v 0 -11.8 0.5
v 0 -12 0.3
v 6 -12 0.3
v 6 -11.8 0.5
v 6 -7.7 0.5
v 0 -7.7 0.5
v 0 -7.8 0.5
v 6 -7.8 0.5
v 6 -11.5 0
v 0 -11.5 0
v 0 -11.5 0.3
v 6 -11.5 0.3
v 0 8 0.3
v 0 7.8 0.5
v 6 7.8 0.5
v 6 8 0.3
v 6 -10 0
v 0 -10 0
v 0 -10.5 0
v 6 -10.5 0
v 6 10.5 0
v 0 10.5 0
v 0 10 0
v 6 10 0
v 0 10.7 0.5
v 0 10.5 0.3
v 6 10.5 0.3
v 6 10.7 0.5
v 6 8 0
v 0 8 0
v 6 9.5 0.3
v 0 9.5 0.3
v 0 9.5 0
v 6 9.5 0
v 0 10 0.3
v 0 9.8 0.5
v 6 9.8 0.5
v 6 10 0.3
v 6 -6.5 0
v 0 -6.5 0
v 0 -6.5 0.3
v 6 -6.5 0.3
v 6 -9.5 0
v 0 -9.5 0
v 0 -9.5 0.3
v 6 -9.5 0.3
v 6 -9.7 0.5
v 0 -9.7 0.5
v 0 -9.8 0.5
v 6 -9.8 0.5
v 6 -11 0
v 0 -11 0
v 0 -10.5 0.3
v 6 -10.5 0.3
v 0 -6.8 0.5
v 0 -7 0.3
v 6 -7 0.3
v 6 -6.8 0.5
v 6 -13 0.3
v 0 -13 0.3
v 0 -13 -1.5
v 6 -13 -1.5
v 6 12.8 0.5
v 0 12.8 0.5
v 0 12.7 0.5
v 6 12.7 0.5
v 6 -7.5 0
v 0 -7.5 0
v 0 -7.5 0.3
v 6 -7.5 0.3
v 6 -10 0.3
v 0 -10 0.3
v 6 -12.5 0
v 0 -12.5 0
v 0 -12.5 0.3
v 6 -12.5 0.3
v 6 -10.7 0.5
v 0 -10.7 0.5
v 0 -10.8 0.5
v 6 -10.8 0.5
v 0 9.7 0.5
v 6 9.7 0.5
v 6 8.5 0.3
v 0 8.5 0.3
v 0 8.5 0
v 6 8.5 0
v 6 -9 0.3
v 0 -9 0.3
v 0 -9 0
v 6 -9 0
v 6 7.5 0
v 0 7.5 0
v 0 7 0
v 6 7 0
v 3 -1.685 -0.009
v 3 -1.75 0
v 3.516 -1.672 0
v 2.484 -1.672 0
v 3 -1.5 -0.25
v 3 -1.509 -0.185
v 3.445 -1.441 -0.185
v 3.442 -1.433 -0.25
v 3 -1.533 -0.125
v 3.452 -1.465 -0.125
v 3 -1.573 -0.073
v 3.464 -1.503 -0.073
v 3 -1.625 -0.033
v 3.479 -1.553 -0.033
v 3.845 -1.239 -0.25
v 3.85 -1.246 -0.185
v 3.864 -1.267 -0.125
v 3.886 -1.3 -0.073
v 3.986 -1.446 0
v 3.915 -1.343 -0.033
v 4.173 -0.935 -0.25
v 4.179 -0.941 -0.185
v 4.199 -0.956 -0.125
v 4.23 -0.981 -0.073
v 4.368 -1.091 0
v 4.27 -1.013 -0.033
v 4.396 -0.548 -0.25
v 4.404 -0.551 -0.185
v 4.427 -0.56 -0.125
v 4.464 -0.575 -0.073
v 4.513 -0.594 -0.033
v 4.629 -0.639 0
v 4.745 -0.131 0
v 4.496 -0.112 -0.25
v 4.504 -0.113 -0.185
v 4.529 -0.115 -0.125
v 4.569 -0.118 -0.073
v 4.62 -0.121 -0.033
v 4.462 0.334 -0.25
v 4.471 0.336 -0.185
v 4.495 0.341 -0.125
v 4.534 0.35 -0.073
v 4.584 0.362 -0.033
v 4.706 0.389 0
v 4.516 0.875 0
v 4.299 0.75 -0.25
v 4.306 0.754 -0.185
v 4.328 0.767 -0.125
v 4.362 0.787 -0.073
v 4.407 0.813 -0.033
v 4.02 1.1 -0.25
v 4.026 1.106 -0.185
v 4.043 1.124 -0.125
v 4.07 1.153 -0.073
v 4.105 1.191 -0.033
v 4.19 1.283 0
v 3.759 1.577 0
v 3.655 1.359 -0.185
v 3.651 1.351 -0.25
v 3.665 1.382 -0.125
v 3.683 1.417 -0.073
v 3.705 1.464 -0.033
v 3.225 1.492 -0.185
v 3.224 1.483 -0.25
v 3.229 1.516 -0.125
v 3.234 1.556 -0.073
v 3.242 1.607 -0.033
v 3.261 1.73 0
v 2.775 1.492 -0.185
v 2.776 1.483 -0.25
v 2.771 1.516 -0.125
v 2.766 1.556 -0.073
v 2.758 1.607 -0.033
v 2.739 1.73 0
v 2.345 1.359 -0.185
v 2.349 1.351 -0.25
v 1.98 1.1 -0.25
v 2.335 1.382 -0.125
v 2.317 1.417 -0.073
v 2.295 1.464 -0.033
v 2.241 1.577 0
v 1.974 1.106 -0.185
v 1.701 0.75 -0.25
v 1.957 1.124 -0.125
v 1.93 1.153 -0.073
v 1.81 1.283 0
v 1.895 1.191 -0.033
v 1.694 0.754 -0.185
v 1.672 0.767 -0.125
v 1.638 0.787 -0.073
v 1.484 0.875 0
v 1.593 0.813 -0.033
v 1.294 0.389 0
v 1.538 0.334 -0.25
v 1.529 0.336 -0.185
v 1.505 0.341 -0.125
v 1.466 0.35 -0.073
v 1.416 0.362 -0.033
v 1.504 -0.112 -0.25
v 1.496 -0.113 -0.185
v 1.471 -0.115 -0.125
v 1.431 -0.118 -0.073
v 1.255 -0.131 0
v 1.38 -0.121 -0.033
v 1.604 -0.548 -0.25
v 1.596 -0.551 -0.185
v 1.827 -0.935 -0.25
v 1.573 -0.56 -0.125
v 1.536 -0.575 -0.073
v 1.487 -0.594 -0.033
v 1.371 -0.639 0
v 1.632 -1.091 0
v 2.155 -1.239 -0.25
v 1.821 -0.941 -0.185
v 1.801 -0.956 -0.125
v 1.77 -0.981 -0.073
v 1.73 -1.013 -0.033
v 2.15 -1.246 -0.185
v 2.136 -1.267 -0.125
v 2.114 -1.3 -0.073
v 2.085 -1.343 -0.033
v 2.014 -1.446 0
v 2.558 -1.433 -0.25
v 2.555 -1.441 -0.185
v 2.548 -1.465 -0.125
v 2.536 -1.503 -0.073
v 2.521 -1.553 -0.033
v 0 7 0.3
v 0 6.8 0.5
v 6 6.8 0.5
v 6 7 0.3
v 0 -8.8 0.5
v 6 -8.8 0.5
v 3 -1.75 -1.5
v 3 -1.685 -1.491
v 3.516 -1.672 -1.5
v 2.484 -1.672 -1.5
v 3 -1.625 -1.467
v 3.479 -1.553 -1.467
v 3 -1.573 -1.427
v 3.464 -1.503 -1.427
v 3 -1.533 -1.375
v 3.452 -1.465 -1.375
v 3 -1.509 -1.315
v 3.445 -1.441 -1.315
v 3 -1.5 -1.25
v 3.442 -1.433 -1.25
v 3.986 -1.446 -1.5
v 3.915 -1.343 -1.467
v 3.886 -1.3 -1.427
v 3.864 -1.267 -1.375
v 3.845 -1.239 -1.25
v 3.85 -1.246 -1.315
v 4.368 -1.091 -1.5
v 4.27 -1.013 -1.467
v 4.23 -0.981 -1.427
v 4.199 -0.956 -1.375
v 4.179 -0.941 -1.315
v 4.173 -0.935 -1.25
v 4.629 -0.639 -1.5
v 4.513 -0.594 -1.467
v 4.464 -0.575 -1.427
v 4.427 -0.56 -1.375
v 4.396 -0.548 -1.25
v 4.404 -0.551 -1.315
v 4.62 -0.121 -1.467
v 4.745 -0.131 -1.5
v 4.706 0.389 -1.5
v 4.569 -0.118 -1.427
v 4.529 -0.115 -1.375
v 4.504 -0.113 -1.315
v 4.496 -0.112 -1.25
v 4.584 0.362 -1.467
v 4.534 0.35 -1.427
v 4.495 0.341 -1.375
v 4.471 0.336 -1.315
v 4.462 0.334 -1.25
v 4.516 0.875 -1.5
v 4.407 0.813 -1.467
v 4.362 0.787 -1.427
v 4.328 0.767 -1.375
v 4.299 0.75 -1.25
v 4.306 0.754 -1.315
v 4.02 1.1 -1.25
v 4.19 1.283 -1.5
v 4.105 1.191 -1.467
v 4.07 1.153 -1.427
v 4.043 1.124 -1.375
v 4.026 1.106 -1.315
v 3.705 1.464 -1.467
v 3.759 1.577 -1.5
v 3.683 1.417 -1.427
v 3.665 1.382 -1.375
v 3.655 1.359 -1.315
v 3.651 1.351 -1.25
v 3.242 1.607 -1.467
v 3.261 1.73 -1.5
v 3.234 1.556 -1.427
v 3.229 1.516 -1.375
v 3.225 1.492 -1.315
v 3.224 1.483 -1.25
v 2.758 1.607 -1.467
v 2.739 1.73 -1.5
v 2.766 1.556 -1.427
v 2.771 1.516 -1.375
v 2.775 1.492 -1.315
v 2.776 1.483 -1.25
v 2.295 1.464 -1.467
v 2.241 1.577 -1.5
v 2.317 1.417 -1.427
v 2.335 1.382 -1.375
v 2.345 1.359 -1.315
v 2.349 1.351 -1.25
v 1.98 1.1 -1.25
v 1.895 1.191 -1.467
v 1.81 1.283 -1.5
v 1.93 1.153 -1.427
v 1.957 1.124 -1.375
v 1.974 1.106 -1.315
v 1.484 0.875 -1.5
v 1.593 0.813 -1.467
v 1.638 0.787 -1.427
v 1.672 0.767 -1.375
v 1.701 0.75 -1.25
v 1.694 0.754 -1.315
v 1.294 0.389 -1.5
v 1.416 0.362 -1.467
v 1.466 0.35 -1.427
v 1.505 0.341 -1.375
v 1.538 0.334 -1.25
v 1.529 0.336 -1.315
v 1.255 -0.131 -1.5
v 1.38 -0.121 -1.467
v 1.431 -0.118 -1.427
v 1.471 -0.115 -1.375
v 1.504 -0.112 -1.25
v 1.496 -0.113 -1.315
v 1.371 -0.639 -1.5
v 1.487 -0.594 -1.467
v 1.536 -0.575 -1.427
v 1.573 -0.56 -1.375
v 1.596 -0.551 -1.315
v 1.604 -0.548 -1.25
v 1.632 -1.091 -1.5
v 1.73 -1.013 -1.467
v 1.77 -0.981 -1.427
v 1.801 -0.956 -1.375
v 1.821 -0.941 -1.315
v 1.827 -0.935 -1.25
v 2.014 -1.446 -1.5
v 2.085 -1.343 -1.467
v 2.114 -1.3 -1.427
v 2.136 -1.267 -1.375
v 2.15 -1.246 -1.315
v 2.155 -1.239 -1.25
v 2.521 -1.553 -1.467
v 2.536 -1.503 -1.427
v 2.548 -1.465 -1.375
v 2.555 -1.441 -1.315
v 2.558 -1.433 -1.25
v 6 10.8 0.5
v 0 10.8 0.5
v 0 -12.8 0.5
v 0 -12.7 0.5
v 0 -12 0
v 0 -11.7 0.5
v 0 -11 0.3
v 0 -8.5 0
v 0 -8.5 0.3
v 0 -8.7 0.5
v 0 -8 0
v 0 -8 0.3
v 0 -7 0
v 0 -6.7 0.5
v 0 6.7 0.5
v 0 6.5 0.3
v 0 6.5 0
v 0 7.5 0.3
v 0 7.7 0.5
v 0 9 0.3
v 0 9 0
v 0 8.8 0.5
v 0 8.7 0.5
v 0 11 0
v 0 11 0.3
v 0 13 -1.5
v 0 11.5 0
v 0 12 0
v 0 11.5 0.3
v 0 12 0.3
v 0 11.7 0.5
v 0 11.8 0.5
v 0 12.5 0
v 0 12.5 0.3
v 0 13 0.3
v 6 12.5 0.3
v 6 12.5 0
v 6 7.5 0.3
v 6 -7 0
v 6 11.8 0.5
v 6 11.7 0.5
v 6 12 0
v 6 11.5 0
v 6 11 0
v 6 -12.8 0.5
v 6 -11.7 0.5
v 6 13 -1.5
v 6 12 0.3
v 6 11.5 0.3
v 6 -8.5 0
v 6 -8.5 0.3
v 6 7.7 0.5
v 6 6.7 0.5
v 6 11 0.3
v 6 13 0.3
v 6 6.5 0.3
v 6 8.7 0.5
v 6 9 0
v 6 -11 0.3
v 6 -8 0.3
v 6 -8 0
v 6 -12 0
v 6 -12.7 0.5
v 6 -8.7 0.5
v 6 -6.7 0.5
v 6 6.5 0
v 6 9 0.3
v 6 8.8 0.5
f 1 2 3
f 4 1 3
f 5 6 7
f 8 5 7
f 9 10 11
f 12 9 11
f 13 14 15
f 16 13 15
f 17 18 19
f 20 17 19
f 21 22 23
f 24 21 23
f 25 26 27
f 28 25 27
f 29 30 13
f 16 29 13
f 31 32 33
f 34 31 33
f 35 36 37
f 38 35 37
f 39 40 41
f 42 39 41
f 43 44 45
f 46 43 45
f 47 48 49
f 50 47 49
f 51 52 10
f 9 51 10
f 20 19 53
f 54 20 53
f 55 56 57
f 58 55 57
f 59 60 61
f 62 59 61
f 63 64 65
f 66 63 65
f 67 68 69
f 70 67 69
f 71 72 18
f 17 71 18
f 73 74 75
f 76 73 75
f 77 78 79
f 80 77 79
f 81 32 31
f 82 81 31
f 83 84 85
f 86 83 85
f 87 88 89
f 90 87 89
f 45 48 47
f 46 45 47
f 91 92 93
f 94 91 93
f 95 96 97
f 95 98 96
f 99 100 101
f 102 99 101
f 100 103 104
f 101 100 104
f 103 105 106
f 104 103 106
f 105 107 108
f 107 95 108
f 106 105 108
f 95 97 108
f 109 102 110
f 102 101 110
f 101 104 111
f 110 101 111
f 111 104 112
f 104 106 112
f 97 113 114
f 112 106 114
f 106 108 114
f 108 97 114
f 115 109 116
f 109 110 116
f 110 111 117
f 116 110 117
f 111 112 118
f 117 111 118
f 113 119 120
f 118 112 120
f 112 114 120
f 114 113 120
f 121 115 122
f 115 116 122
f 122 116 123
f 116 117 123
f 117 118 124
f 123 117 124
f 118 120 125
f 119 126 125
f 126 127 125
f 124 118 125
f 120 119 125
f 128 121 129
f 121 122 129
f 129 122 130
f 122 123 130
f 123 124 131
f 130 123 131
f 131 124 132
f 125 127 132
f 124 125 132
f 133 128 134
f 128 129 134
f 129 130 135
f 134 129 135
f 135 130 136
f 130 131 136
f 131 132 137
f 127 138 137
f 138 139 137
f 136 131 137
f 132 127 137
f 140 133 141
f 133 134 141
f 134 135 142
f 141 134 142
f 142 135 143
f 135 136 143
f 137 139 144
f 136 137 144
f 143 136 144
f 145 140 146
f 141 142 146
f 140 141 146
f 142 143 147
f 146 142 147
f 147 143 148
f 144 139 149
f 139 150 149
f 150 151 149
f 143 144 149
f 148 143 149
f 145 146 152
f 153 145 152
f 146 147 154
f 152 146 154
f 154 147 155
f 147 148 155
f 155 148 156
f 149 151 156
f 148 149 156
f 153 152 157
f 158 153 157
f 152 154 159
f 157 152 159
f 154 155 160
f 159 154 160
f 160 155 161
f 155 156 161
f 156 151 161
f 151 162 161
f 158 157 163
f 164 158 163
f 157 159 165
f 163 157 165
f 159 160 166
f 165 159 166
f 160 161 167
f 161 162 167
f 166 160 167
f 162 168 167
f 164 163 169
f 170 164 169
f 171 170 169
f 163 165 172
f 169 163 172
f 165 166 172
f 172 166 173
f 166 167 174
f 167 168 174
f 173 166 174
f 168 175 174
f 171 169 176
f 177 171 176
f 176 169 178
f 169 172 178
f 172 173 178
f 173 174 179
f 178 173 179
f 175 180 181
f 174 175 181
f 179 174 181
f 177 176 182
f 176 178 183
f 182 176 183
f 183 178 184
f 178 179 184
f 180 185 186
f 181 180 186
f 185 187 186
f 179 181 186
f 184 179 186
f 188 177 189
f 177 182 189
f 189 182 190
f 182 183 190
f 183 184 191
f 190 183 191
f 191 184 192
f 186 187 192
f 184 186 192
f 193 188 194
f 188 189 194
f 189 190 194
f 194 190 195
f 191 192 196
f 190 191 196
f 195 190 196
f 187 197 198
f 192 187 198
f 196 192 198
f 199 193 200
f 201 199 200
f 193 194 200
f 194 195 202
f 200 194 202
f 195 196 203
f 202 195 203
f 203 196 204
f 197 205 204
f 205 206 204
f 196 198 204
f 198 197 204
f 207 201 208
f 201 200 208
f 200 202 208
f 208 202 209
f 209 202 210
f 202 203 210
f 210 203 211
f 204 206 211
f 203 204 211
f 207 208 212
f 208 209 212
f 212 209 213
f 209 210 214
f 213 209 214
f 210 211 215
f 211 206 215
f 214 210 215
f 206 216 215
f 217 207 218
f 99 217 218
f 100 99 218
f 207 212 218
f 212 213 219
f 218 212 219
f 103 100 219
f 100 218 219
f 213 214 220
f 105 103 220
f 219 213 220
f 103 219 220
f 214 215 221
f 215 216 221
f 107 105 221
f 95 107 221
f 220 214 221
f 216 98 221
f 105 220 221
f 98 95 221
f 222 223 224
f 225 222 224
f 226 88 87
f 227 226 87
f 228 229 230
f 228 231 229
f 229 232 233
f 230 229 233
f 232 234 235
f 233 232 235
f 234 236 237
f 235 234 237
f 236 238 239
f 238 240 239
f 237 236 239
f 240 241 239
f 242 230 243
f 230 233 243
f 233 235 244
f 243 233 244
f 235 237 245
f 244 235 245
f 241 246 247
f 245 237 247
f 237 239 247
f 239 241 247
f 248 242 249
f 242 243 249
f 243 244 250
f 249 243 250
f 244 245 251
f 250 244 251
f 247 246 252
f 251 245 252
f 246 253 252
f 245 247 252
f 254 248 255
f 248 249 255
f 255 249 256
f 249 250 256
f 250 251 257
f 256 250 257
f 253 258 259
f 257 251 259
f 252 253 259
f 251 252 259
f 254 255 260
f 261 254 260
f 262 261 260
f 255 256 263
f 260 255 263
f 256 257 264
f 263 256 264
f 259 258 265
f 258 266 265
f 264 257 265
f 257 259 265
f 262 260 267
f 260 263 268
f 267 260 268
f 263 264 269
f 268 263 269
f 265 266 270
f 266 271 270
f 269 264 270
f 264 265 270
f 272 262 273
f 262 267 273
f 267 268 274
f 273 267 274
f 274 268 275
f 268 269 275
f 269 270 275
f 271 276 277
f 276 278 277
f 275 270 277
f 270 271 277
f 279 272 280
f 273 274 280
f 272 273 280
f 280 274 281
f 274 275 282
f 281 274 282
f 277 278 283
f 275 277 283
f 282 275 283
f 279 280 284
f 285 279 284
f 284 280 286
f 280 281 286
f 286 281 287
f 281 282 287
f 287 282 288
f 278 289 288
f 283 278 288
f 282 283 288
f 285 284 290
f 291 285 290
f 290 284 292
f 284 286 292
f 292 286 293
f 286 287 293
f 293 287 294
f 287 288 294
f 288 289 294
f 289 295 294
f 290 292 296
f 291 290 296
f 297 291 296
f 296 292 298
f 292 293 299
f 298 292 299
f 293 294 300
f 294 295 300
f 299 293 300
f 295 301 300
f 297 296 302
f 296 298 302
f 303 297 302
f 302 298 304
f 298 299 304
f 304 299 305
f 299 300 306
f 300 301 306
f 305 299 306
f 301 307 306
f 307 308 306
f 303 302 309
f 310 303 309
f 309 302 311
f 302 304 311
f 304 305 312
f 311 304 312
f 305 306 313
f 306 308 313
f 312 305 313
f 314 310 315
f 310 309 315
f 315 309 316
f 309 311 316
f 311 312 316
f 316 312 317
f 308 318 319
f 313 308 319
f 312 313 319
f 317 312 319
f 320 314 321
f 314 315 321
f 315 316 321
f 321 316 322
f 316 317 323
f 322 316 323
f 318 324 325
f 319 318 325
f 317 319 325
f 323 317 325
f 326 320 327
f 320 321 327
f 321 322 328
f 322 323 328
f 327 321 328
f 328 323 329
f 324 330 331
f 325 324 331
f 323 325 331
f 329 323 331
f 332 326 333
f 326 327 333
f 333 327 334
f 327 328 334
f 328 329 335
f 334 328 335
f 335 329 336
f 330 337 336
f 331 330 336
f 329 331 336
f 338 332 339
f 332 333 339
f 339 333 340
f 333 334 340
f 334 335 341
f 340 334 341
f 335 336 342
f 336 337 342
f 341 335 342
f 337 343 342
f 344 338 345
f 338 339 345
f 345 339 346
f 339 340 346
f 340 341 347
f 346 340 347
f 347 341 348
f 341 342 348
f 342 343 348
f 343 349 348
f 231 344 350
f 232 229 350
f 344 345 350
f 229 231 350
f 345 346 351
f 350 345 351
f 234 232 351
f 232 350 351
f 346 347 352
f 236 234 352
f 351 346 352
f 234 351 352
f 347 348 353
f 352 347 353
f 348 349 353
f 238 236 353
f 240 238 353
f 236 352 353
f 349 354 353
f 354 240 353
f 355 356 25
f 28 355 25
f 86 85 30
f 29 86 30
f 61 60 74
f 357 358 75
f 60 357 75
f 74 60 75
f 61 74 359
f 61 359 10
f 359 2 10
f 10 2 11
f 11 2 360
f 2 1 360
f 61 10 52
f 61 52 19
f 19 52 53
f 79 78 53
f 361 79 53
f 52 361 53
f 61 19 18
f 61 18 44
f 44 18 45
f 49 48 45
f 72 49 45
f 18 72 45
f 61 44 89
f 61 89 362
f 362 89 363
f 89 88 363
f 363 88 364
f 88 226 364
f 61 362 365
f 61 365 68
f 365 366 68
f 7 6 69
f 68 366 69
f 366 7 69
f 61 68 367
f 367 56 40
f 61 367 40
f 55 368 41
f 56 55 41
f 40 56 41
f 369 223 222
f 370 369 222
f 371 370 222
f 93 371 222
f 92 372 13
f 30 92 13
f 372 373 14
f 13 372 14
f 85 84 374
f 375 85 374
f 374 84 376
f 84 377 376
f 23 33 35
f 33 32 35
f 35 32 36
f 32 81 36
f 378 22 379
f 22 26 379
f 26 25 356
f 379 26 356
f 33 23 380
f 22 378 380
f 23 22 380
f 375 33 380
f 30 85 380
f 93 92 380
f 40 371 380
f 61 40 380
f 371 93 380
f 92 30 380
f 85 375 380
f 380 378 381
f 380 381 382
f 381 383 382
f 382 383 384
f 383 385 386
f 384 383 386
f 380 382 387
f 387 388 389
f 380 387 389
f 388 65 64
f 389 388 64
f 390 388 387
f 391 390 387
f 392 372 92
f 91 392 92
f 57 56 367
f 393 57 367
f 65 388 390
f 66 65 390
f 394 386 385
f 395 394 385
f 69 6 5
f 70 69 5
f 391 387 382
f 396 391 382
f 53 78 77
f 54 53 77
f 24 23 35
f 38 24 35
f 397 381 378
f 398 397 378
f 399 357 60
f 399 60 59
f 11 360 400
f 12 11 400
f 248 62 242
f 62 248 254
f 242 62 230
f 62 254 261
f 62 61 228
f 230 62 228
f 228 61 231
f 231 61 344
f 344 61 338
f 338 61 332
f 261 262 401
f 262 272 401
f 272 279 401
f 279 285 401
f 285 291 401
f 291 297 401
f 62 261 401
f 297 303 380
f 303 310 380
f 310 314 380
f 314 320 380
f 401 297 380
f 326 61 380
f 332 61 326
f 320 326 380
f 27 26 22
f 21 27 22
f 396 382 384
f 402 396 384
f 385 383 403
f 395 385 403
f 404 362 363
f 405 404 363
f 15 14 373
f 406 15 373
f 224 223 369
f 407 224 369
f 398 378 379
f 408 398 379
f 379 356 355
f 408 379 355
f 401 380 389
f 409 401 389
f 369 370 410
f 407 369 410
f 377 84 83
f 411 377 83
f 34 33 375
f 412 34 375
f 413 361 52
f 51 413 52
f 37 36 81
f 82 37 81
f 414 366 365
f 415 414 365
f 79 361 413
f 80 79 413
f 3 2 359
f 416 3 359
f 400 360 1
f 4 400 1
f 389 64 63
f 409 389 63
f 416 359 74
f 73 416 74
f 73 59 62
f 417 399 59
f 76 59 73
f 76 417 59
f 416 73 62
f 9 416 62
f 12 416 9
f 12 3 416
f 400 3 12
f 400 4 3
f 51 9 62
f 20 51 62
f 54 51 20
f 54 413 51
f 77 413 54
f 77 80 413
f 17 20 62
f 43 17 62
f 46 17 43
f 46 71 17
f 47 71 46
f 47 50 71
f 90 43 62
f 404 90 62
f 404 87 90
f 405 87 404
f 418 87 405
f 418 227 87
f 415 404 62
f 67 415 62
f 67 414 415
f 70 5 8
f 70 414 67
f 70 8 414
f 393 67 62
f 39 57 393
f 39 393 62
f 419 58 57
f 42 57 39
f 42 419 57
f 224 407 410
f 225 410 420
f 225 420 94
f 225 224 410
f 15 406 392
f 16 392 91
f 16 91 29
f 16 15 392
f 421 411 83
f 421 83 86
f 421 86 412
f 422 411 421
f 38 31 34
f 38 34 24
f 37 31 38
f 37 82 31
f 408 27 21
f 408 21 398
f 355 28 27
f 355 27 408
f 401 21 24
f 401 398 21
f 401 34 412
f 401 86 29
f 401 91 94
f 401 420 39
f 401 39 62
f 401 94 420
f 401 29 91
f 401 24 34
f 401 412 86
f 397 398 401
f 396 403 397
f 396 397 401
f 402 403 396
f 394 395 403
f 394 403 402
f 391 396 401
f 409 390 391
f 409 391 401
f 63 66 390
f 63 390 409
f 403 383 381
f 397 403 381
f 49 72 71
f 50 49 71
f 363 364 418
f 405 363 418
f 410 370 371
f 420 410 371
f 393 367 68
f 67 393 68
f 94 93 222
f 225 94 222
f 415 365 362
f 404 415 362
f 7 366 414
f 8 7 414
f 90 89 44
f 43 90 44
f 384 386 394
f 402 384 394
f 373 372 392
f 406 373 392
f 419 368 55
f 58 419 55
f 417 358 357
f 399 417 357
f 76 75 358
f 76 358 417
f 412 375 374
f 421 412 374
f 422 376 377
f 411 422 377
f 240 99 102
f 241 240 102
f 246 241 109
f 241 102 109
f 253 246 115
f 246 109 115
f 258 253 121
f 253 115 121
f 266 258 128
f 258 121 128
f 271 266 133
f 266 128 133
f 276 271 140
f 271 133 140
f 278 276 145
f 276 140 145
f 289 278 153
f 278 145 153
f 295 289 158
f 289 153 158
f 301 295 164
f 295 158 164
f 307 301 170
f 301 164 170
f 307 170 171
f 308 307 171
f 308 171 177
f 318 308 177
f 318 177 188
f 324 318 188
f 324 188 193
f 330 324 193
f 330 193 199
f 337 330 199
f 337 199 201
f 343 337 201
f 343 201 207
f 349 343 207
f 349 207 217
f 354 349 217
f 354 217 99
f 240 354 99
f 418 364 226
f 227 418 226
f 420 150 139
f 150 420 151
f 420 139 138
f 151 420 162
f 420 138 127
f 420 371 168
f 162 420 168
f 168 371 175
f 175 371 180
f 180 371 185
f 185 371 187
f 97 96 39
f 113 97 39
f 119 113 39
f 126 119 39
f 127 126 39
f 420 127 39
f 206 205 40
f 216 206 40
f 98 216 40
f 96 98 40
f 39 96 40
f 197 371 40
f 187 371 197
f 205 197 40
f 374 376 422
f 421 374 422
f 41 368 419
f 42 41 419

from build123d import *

# Parameters (mm, degrees)
PAD_DEPTH    = 6
SKETCH001_R  = 1.5
HOLE_DEPTH   = 25
FILLET_R     = 0.25
CHAMFER_SIZE = 0.2


with BuildPart() as part:
    # Sketch → Pad (new body)
    with BuildSketch(Plane.YZ):
        Polygon((-13, 0.5), (-13, -1.5), (13, -1.5), (13, 0.5), (12.5, 0.5), (12.5, 2e-06), (12, 2e-06), (12, 0.5), (11.5, 0.5), (11.5, 0), (11, 0), (11, 0.5), (10.5, 0.5), (10.5, 0), (10, 0), (10, 0.5), (9.5, 0.5), (9.5, 0), (9, 0), (9, 0.5), (8.5, 0.5), (8.5, 0), (8, 0), (8, 0.5), (7.5, 0.5), (7.5, 0), (7, 0), (7, 0.5), (6.5, 0.5), (6.5, 0), (0, 0), (-6.5, 0), (-6.5, 0.5), (-7, 0.5), (-7, 0), (-7.5, 0), (-7.5, 0.5), (-8, 0.5), (-8, 0), (-8.5, 0), (-8.5, 0.5), (-9, 0.5), (-9, 0), (-9.5, 0), (-9.5, 0.5), (-10, 0.5), (-10, 0), (-10.5, 0), (-10.5, 0.5), (-11, 0.5), (-11, 0), (-11.5, 0), (-11.5, 0.5), (-12, 0.5), (-12, 0), (-12.5, 0), (-12.5, 0.5), align=None)
    extrude(amount=PAD_DEPTH)

    # Sketch001 (on Face58 of Pad) → Hole (cut)
    with BuildSketch(Plane(origin=(0, 0, 0), x_dir=(0, -1, 0), z_dir=(0, 0, 1))):
        with Locations((0, 3)):
            Circle(SKETCH001_R)
    extrude(amount=-HOLE_DEPTH, mode=Mode.SUBTRACT)

    # Fillet
    fillet_edges = [part.edges().sort_by_distance(p)[0] for p in [
        (3, -1.5, 0),
        (3, -1.5, -1.5),
    ]]
    fillet(fillet_edges, radius=FILLET_R)

    # Chamfer
    chamfer_edges = [part.edges().sort_by_distance(p)[0] for p in [
        (3, -13, 0.5),
        (3, -12, 0.5),
        (3, -12.5, 0.5),
        (3, -11.5, 0.5),
        (3, -11, 0.5),
        (3, -10.5, 0.5),
        (3, -10, 0.5),
        (3, -9.5, 0.5),
        (3, -9, 0.5),
        (3, -8.5, 0.5),
        (3, -8, 0.5),
        (3, -7.5, 0.5),
        (3, -7, 0.5),
        (3, -6.5, 0.5),
        (3, 6.5, 0.5),
        (3, 7, 0.5),
        (3, 7.5, 0.5),
        (3, 8, 0.5),
        (3, 8.5, 0.5),
        (3, 9, 0.5),
        (3, 9.5, 0.5),
        (3, 10, 0.5),
        (3, 10.5, 0.5),
        (3, 11, 0.5),
        (3, 11.5, 0.5),
        (3, 12, 0.5),
        (3, 12.5, 0.5),
        (3, 13, 0.5),
    ]]
    chamfer(chamfer_edges, length=CHAMFER_SIZE)


solid = part.part
